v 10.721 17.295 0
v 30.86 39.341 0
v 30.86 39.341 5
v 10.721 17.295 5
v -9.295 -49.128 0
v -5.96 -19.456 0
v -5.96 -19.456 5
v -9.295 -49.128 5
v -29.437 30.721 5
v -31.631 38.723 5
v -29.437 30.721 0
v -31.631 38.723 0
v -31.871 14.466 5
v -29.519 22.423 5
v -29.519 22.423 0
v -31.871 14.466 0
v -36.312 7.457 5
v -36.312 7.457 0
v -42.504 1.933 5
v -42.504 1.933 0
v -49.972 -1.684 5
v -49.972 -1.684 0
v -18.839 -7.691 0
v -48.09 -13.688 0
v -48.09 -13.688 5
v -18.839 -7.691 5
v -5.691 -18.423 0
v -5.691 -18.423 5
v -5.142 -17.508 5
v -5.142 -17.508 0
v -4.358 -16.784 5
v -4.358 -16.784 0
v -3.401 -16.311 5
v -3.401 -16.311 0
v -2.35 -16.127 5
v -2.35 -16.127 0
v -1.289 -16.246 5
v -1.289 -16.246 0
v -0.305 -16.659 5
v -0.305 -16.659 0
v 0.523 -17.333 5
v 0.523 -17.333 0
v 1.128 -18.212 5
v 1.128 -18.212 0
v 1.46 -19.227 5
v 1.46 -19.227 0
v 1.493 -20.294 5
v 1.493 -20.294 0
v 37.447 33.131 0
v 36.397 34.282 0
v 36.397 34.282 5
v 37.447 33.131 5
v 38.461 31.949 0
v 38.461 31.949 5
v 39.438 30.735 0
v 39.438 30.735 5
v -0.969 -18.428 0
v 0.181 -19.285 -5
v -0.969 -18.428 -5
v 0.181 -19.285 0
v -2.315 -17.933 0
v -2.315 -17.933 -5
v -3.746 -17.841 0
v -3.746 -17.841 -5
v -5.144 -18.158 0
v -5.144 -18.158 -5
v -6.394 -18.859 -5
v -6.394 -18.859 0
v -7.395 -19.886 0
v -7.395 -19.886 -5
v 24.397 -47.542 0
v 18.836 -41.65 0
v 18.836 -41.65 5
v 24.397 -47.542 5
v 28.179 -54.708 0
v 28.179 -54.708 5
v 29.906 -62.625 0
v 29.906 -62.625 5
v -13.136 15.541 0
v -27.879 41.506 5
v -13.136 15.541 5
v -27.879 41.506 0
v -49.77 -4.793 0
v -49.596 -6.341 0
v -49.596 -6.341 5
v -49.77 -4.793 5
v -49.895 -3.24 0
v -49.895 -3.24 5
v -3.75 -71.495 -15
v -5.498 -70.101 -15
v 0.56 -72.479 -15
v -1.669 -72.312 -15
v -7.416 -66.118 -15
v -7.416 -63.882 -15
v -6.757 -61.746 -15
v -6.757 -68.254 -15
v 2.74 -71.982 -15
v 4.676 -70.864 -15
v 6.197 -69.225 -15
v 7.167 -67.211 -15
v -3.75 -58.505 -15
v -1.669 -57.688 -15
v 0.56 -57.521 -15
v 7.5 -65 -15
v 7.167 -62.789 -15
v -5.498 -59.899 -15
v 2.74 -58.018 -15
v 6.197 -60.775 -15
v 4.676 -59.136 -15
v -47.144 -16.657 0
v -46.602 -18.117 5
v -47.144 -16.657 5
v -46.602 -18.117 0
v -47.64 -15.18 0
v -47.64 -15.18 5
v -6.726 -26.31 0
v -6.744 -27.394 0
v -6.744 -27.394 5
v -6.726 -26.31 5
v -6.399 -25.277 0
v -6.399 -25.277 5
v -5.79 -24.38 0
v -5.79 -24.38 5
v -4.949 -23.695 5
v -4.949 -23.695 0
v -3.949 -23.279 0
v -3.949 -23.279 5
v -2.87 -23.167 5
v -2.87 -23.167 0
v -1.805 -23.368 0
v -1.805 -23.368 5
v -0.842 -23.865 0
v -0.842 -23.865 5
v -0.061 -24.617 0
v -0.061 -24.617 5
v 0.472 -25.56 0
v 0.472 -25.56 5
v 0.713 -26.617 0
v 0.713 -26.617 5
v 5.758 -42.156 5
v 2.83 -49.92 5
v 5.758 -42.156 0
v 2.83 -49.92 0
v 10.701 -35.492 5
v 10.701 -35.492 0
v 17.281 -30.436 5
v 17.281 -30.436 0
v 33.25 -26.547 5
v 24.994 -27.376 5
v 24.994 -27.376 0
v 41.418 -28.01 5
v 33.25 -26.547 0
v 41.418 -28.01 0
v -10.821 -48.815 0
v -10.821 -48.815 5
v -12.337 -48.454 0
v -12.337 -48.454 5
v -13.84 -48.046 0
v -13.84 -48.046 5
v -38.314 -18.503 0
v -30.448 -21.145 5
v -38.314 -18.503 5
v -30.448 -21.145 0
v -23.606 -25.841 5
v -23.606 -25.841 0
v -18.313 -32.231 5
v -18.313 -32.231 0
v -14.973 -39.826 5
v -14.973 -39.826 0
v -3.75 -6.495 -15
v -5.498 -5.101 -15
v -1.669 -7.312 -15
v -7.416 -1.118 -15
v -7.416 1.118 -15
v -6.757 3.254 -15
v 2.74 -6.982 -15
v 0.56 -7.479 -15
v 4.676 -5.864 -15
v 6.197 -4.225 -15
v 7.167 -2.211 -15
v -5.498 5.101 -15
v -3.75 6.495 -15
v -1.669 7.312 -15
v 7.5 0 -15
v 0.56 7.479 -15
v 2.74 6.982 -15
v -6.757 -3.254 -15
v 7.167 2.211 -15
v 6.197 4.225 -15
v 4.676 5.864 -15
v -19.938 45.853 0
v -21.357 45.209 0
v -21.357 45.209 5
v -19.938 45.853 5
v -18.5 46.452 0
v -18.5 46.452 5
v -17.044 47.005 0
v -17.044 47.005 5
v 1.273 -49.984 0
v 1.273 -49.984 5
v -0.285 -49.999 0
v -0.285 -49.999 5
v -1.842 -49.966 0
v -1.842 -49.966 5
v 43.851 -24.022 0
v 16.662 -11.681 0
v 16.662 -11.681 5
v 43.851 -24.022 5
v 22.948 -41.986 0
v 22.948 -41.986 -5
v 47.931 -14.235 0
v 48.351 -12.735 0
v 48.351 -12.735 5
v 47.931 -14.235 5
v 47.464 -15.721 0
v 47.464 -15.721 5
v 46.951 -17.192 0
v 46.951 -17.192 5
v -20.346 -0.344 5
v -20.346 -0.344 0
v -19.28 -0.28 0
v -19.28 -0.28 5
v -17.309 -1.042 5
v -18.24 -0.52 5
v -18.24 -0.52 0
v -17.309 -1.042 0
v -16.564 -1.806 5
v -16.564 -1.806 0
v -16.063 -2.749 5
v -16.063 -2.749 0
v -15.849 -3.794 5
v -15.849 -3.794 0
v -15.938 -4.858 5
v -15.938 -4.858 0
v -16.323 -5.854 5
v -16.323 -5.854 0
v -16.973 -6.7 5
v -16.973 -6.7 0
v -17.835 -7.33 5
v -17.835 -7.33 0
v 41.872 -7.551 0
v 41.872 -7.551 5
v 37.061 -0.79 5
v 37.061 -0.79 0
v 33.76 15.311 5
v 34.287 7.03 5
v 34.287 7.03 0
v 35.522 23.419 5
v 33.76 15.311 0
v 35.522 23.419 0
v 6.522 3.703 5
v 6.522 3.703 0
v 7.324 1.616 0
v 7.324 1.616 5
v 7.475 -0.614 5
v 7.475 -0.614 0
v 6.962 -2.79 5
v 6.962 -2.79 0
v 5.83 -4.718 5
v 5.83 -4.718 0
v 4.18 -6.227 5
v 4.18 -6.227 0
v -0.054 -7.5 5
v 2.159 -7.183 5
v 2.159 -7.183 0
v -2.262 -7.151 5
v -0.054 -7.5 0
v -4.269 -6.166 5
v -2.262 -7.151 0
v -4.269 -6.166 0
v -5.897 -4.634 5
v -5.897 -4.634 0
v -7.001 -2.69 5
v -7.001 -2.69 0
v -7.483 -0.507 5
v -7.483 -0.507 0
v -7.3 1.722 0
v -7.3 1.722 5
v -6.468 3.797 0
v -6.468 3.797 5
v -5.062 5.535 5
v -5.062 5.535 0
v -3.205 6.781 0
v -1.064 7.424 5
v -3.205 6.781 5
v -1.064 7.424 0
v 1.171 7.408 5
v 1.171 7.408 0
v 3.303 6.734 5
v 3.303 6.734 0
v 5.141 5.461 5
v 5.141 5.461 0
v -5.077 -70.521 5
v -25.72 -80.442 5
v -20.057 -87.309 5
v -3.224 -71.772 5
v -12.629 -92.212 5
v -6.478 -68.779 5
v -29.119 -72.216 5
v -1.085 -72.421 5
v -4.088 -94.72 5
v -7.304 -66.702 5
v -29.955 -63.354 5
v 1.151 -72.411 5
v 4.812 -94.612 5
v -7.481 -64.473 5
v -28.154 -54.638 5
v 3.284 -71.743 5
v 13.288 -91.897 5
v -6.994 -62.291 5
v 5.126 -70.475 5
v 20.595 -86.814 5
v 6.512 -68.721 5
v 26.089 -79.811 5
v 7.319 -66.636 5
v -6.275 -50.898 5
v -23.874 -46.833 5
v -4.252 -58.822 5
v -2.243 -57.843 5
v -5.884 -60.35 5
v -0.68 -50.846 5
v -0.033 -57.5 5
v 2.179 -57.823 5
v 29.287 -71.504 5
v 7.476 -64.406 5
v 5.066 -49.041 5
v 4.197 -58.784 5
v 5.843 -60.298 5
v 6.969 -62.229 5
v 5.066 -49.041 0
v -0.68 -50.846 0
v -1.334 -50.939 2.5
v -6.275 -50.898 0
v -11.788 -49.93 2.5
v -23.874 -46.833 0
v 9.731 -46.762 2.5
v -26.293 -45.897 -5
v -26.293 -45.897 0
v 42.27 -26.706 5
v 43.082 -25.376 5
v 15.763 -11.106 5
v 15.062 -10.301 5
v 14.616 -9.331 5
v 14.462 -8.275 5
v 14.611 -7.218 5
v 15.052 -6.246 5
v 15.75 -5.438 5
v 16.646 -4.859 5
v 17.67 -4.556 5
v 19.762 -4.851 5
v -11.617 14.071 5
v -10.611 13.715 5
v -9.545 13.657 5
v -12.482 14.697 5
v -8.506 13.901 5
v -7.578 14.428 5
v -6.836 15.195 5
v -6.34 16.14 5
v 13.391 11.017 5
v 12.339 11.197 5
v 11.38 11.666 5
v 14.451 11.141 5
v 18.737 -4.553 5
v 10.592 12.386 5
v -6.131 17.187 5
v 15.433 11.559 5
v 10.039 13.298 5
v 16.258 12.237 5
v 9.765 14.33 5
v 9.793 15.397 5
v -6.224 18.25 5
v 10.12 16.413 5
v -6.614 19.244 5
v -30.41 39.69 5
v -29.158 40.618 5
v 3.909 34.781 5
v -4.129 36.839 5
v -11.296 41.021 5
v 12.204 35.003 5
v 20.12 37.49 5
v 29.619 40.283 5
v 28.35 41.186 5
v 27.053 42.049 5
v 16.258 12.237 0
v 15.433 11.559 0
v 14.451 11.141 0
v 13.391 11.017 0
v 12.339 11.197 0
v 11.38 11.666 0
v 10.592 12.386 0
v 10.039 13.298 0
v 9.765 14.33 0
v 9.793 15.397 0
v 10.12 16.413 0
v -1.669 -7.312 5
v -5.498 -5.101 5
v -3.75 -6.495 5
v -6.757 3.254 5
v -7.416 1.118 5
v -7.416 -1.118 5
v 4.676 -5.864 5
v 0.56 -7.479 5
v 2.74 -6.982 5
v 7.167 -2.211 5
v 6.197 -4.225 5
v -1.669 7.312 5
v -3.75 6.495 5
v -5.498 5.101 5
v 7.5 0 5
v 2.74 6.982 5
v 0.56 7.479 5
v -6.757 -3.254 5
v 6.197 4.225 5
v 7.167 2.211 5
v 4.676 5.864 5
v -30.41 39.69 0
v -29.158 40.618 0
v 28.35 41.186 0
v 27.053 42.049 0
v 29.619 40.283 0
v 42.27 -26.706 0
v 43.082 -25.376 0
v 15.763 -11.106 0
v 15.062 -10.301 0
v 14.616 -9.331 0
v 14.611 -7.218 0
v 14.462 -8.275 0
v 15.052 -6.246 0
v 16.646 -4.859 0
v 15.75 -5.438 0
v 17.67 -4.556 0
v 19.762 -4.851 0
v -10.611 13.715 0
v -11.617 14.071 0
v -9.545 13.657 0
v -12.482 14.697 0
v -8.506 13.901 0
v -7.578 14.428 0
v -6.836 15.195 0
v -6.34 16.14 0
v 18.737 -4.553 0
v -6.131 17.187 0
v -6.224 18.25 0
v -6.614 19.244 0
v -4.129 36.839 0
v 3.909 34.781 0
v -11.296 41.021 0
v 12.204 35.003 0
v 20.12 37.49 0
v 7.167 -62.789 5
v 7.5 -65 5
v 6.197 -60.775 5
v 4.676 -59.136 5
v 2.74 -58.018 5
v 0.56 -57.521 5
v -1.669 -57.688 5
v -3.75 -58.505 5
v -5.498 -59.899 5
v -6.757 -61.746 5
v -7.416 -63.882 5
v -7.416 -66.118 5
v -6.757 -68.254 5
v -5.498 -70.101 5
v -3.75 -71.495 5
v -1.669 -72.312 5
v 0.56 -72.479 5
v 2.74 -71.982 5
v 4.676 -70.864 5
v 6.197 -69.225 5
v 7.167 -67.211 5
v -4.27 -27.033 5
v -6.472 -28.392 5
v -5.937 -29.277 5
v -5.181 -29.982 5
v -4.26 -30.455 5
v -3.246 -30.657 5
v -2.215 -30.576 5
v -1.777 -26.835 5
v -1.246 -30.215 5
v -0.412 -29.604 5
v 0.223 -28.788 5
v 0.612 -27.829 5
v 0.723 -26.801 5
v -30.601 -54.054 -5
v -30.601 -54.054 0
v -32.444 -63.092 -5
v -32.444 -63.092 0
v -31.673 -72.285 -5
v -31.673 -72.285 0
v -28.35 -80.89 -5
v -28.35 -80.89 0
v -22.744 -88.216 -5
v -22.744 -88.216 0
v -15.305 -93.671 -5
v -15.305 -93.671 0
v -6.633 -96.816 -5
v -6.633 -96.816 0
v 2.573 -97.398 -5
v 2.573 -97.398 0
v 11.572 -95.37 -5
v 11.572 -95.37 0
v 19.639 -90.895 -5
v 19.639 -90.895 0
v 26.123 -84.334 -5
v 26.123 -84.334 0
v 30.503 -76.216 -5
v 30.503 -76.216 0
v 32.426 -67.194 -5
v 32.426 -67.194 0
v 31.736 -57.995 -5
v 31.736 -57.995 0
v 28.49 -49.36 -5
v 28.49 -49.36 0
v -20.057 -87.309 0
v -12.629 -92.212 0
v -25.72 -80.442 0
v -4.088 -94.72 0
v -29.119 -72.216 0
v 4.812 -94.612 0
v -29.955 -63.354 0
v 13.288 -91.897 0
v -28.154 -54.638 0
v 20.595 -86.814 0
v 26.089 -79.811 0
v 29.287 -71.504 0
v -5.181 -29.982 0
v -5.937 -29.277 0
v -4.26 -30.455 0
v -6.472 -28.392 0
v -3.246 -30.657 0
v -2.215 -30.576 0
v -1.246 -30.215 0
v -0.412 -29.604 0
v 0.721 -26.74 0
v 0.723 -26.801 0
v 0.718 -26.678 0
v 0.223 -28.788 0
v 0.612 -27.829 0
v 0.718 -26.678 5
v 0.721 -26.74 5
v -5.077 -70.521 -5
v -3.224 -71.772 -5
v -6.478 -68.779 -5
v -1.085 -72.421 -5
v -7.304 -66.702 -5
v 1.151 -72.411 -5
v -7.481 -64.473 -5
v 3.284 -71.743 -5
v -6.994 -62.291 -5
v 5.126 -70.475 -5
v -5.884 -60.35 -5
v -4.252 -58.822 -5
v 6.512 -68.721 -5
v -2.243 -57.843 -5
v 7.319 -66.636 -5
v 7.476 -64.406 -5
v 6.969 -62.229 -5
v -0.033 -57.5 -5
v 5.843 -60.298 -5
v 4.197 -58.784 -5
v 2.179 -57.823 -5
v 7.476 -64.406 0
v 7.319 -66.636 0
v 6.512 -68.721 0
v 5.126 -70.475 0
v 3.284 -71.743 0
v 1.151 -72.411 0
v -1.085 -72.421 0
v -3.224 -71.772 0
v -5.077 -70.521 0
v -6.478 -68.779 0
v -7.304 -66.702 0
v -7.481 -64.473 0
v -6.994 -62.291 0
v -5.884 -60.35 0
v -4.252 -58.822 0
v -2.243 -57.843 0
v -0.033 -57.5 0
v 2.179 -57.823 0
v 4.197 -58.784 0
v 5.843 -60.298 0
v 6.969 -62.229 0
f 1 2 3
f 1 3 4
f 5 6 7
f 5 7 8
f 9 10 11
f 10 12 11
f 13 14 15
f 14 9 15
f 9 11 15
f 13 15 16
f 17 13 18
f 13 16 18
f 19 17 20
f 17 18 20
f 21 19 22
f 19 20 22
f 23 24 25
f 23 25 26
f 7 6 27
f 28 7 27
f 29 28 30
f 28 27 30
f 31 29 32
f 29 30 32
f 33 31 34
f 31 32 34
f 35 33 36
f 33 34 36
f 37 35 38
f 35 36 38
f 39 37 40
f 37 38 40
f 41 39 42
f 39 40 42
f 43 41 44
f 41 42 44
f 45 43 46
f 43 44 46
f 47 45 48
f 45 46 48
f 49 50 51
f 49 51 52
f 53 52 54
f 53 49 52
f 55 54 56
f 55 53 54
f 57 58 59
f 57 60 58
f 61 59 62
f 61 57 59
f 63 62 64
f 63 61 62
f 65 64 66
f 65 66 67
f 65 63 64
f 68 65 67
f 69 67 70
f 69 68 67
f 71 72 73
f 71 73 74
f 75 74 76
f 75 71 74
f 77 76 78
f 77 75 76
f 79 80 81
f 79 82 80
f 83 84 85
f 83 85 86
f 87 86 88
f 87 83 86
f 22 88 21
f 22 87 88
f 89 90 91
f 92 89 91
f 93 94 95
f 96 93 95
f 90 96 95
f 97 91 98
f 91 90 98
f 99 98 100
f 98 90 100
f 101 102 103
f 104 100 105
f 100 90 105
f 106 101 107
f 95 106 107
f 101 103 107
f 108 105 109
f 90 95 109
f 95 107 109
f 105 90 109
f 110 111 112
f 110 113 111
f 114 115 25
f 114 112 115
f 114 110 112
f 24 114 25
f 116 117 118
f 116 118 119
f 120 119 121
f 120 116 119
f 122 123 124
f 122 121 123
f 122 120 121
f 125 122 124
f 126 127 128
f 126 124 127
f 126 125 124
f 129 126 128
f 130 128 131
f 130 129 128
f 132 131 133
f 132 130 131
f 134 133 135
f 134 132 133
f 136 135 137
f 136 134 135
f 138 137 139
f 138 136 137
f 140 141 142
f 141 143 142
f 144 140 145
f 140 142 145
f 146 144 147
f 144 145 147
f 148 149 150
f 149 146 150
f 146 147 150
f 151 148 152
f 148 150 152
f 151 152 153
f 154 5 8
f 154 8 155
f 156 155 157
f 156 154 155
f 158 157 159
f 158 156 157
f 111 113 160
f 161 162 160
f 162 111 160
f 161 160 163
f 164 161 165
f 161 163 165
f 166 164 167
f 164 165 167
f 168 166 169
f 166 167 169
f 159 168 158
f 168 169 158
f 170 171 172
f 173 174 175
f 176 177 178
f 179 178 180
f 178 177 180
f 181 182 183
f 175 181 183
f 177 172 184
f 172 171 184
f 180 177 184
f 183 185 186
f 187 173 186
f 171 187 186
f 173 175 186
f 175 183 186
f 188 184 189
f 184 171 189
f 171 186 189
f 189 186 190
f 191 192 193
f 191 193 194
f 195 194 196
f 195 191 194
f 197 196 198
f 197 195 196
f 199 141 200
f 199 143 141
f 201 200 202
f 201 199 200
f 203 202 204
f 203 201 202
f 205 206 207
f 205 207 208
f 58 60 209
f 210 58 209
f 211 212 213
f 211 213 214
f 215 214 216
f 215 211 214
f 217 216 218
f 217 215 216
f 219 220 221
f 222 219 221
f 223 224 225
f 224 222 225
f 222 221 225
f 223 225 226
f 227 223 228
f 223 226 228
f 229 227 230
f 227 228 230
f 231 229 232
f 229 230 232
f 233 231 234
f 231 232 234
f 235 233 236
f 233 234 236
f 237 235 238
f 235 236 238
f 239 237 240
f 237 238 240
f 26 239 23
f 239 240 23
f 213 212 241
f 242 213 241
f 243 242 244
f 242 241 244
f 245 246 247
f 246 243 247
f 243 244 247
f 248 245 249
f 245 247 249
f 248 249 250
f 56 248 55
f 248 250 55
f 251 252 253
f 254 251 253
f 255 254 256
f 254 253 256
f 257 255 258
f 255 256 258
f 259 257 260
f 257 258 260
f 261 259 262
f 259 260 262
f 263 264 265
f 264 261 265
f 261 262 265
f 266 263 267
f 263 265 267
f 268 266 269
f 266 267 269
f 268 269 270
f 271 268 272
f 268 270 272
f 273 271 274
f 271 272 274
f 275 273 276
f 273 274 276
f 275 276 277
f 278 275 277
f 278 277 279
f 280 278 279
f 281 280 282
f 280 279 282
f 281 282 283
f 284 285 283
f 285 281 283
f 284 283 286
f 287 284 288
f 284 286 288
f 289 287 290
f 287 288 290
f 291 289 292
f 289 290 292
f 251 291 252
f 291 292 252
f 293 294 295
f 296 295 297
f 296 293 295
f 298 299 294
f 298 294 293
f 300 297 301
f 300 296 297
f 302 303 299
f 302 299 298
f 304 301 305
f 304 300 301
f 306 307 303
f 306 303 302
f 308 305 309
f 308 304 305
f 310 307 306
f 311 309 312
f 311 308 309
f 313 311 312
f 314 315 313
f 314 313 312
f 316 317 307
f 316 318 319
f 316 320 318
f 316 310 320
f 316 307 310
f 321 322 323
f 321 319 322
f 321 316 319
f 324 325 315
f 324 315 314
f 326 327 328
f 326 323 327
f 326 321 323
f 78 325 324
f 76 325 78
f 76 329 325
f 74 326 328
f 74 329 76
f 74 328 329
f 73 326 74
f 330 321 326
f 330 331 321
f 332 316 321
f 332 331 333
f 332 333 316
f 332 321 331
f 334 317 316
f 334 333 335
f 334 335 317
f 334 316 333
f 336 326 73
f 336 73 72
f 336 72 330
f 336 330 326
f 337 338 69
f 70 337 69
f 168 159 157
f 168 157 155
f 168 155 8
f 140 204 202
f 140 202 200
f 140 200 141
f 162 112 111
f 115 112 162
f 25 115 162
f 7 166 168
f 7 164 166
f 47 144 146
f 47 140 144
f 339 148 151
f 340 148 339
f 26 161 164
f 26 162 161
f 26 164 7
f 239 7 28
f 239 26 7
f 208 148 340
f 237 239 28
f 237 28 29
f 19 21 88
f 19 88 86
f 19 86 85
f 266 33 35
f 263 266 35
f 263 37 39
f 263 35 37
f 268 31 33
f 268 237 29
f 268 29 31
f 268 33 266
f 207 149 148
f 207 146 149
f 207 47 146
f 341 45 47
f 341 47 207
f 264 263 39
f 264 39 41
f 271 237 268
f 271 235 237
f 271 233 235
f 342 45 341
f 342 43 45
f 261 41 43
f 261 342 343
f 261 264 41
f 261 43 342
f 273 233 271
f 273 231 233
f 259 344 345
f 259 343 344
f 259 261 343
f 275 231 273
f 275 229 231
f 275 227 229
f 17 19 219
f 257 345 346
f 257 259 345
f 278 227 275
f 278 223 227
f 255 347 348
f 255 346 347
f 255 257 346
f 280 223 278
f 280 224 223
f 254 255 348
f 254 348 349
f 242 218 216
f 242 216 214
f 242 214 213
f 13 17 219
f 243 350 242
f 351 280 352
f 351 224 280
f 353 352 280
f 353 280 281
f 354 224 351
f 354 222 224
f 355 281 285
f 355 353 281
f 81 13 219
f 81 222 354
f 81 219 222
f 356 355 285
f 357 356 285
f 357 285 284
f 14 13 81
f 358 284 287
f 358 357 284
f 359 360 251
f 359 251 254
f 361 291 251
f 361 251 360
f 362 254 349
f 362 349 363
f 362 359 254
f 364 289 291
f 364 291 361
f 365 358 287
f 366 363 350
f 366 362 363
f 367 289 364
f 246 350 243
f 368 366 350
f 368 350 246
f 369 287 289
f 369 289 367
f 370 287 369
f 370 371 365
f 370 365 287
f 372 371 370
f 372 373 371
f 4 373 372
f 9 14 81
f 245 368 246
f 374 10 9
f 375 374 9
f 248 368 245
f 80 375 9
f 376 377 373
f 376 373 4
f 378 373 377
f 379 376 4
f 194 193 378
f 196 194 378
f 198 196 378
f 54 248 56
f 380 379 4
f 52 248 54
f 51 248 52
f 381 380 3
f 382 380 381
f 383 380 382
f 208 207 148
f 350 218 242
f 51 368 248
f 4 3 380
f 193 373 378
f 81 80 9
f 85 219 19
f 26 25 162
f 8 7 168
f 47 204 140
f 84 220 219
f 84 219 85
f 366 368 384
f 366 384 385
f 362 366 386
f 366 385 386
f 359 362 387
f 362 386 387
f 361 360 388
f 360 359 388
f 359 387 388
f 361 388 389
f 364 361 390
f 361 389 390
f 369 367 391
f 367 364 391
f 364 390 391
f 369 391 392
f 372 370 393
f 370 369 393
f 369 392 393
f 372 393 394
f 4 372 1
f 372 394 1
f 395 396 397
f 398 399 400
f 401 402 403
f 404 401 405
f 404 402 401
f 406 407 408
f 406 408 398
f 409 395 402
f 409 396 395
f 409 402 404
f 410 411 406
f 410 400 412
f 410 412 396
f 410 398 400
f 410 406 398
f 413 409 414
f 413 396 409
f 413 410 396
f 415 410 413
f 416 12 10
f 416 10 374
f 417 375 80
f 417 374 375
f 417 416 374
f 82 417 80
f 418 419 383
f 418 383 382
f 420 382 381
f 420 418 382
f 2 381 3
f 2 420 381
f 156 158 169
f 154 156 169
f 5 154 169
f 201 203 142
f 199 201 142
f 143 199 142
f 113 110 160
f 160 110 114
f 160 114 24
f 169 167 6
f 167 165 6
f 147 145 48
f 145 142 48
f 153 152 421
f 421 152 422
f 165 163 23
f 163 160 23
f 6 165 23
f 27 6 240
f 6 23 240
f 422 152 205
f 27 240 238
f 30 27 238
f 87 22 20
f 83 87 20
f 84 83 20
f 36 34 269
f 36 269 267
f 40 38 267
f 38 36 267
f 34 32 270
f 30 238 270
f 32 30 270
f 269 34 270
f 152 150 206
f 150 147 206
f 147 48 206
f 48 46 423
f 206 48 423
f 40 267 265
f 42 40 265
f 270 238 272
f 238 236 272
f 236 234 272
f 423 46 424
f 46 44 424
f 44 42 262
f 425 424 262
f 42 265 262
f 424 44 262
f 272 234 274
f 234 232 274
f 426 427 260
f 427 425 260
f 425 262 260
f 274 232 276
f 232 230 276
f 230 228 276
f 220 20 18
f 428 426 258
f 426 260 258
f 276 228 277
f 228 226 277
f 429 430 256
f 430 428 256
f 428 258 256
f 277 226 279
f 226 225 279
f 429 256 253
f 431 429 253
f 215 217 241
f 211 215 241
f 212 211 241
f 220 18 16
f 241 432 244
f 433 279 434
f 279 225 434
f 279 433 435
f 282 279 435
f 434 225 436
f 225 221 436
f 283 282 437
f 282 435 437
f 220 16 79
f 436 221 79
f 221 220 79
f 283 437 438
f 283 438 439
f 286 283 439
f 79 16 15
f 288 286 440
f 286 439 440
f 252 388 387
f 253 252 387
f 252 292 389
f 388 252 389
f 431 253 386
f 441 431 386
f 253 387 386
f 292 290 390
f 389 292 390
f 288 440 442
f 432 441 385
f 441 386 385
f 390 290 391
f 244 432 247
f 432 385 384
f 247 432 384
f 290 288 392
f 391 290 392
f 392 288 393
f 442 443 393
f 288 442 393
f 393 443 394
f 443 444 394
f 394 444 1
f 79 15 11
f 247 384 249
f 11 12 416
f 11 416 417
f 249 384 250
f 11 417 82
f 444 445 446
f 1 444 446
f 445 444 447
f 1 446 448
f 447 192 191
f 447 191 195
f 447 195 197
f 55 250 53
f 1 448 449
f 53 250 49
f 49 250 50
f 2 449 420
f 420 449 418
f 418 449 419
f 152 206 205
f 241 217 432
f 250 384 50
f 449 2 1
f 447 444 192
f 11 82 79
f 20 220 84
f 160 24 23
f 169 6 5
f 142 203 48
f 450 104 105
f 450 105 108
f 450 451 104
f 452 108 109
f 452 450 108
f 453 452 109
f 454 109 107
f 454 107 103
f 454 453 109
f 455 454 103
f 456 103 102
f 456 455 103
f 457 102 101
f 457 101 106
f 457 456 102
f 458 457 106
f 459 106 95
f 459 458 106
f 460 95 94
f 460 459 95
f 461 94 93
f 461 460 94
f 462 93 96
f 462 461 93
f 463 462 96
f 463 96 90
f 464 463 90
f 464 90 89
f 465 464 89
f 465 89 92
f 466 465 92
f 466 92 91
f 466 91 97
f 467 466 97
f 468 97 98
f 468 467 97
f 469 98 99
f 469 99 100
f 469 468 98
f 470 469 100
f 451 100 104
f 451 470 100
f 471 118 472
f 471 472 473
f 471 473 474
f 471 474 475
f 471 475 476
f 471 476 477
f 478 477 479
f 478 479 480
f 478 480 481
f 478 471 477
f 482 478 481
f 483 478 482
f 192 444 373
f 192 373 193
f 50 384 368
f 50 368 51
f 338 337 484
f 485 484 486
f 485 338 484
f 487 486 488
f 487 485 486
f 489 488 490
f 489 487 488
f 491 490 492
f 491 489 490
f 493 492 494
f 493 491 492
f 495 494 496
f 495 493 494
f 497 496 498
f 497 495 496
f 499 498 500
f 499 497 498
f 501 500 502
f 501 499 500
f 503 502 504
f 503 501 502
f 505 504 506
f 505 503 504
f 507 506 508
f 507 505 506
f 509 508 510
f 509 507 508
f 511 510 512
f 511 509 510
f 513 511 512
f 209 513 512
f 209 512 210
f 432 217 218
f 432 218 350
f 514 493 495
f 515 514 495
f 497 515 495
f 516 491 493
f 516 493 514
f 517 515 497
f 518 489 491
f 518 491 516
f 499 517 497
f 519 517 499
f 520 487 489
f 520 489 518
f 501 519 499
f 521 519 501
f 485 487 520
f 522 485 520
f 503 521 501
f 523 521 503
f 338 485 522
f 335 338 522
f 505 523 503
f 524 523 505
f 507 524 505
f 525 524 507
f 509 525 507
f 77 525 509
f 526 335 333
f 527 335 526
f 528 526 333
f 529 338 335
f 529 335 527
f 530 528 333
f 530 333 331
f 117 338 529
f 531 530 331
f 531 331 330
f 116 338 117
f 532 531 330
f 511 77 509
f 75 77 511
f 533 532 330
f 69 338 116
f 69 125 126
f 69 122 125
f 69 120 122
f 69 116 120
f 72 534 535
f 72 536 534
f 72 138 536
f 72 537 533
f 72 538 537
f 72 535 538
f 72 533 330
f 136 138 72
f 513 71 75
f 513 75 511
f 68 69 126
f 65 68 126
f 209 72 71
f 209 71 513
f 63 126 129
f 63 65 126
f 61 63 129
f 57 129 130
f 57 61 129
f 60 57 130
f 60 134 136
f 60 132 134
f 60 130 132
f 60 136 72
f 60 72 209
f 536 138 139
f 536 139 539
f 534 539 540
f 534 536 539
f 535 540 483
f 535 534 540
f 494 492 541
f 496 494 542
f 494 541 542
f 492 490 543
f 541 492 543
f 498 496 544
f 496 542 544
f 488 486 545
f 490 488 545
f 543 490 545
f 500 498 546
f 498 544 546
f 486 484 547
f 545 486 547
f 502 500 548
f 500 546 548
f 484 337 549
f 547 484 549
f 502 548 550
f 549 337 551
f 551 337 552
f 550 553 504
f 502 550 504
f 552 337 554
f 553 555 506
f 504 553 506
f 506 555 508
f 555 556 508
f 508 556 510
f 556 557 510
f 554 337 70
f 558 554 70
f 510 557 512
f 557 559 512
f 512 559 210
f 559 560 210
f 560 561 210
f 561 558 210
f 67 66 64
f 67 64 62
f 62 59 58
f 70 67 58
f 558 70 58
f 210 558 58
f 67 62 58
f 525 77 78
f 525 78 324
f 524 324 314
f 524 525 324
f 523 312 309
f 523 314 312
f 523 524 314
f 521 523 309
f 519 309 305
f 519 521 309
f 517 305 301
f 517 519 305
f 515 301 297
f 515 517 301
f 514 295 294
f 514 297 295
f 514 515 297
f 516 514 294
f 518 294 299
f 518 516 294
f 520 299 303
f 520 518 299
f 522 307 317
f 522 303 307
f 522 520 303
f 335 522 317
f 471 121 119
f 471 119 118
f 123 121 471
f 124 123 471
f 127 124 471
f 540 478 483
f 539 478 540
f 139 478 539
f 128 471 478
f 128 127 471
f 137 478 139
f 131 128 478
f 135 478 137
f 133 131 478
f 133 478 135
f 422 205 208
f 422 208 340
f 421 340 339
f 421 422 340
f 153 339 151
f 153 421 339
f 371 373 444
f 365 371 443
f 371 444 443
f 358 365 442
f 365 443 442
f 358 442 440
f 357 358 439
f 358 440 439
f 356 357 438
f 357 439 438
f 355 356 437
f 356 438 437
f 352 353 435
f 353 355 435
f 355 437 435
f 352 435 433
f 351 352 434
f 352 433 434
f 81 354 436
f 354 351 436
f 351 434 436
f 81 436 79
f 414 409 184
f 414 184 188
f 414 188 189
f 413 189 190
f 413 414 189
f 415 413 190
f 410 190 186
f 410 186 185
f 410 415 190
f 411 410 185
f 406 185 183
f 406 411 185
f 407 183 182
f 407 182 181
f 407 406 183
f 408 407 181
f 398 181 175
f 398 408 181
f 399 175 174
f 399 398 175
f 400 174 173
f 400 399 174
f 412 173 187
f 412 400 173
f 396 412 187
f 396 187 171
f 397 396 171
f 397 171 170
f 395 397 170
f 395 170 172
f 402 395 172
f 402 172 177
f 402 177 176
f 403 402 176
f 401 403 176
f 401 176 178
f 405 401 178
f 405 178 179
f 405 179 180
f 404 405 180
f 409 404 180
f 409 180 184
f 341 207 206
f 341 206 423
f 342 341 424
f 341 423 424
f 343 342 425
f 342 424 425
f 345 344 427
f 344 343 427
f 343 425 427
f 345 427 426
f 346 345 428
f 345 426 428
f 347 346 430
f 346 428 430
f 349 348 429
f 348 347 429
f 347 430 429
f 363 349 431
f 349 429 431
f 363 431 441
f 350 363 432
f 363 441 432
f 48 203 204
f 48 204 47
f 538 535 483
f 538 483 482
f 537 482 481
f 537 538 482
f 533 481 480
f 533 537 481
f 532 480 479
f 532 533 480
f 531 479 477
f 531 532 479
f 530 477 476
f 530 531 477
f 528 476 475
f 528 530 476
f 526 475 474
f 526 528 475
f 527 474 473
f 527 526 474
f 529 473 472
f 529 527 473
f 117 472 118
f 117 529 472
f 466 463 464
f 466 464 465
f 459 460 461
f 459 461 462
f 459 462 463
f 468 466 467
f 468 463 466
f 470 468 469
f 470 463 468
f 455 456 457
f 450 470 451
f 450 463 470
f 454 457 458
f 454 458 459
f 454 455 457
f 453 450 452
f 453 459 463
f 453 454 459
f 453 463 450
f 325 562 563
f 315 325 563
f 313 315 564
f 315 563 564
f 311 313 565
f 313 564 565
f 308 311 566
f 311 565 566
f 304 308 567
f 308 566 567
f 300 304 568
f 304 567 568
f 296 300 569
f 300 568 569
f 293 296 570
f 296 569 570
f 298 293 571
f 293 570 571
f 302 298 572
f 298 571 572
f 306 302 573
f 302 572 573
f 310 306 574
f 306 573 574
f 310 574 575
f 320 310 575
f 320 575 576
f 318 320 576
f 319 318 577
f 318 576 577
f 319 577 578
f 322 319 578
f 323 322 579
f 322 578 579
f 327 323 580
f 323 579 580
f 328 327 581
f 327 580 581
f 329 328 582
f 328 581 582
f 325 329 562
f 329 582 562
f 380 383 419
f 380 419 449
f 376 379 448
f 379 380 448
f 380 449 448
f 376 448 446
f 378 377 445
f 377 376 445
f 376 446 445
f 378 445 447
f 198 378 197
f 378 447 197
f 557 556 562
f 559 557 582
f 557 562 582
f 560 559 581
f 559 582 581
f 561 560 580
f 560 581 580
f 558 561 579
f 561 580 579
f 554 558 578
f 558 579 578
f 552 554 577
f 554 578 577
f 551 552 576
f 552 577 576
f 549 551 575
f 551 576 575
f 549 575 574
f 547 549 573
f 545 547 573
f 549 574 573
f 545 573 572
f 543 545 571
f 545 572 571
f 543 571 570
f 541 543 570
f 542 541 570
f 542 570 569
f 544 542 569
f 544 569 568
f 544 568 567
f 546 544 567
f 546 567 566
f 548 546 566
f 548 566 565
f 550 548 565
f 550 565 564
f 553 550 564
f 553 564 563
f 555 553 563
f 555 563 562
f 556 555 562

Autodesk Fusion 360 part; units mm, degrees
sketch "Sketch1" plane through (0, 0, 0) normal (0, 0, 1) x (1, 0, 0) in component "Follower"
  line L0 (0, 0) -> (29.3893, -40.4508) construction
  line L1 (0, 0) -> (50, 0) construction
  line L2 (0, 0) -> (-9.5515, -13.1465) construction
  line L3 (0, 0) -> (50, 0) construction
  line L4 (8.7219, -18.3845) -> (26.3554, -42.655)
  line L5 (32.4231, -38.2467) -> (14.7895, -13.9761)
  arc A0 (14.7895, -13.9761) -> (8.7219, -18.3845) centre (11.7557, -16.1803) ccw
  line L6 (20.1799, 2.6139) -> (48.5777, 11.8409)
  arc A1 (17.8623, 9.7468) -> (20.1799, 2.6139) centre (19.0211, 6.1803) ccw
  line L7 (46.394, 19.0173) -> (17.8623, 9.7468)
  line L8 (3.75, 20) -> (3.75, 50)
  arc A2 (-3.75, 20) -> (3.75, 20) centre (0, 20) ccw
  line L9 (-3.75, 50) -> (-3.75, 20)
  line L10 (-17.8623, 9.7468) -> (-46.394, 19.0173)
  arc A3 (-20.1799, 2.6139) -> (-17.8623, 9.7468) centre (-19.0211, 6.1803) ccw
  line L11 (-48.7116, 11.8844) -> (-20.1799, 2.6139)
  line L12 (-14.7895, -13.9761) -> (-32.4231, -38.2467)
  arc A4 (-8.7219, -18.3845) -> (-14.7895, -13.9761) centre (-11.7557, -16.1803) ccw
  line L13 (-26.3554, -42.655) -> (-8.7219, -18.3845)
  circle A5 centre (0, 0) radius 7.5
  arc A6 (22.1872, -44.8077) -> (-22.1872, -44.8077) centre (0, -65) ccw
  arc A7 (-29.3183, -40.5023) -> (-18.1729, -31.3928) centre (0, -65) ccw construction
  arc A8 (-29.3893, -40.4508) -> (-29.3183, -40.5023) centre (0, 0) ccw
  arc A9 (-26.2727, -42.5411) -> (-22.1872, -44.8077) centre (0, 0) ccw
  arc A10 (22.1872, -44.8077) -> (26.2727, -42.5411) centre (0, 0) ccw
  arc A11 (29.3183, -40.5023) -> (29.3893, -40.4508) centre (0, 0) ccw
  arc A12 (49.4709, 7.2549) -> (35.7584, -34.9476) centre (61.8187, -20.0861) ccw
  arc A13 (8.3875, 49.2915) -> (44.2871, 23.2089) centre (38.206, 52.5861) ccw
  arc A14 (-44.2871, 23.2089) -> (-8.3875, 49.2915) centre (-38.206, 52.5861) ccw
  arc A15 (-35.7584, -34.9476) -> (-49.4709, 7.2549) centre (-61.8187, -20.0861) ccw
  arc A16 (-48.5777, 11.8409) -> (-49.4709, 7.2549) centre (0, 0) ccw
  arc A17 (-35.7584, -34.9476) -> (-32.3403, -38.1327) centre (0, 0) ccw
  arc A18 (-3.75, 49.8592) -> (-8.3875, 49.2915) centre (0, 0) ccw
  arc A19 (-44.2871, 23.2089) -> (-46.2601, 18.9738) centre (0, 0) ccw
  arc A20 (46.2601, 18.9738) -> (44.2871, 23.2089) centre (0, 0) ccw
  arc A21 (8.3875, 49.2915) -> (3.75, 49.8592) centre (0, 0) ccw
  arc A22 (32.3403, -38.1327) -> (35.7584, -34.9476) centre (0, 0) ccw
  arc A23 (50, 0) -> (48.5777, 11.8409) centre (0, 0) ccw
  dimension "d1" = 100
  dimension "d2" = 54
  dimension "d3" = 50
  dimension "d4" = 126
  dimension "d5" = 65
  dimension "d6" = 60
  dimension "d8" = 20
  dimension "d11" = 15
  dimension "d13" = 360
extrude "Extrude1" add sketch "Sketch1" along normal blind 5 makes body 1 in component "Follower"
sketch "Sketch1 (2)" plane through (0, 0, 0) normal (0, 0, 1) x (1, 0, 0) in component "Cam"
  arc A0 (-29.3183, -40.5023) -> (-18.1729, -31.3928) centre (0, -65) ccw
  circle A1 centre (0, -65) radius 30
  circle A2 centre (0, -65) radius 32.5
  circle A3 centre (0, -65) radius 7.5
  circle A4 centre (0, -26.794) radius 3.75
  line L0 (-24.6979, -43.875) -> (-3.7997, -19.4423)
  line L1 (3.7997, -19.4423) -> (24.6979, -43.875)
  arc A5 (3.7997, -19.4423) -> (-3.7997, -19.4423) centre (0, -22.6923) ccw
  spline S0 degree 2 poles (-22.3607, -45) (0, -53.1337) (20.6252, -43.2146) knots 0 0 0 4.511642 4.511642 4.511642 weights 1 3 1
  point P0 (0, -15)
  dimension "d16" = 60
  dimension "d17" = 65
  dimension "d18" = 15
  dimension "d19" = 7.5
  dimension "d20" = 15
  dimension "d21" = 5
  dimension "d23" = 20
extrude "Extrude1'" add sketch "Sketch1 (2)" against normal blind 5 separate body contours A0 A2 A4 L0 L1 | A0 A4 L0 L1 A5 | A0 A4 | A0 A4 | A2 | A1 S0 | A1 S0 makes body 2 in component "Cam"
extrude "Extrude2" add sketch "Sketch1 (2)" along normal blind 5 contours A0 A4 | A0 A4 | A1 S0 picked at (14.8588, -54.2841) bodies 2 in component "Cam"
cylinder "CylinderPrimitive1" add diameter 15 height -20 placed x (1, 0, 0) y (0, 1, 0) z (0, 0, 1) at (0, 0, 5) separate body makes body 3 in component "Component"
component "Follower" placed x (0.869606, 0.493747, 0) y (-0.493747, 0.869606, 0) z (0, 0, 1) at (0, 0, 0)
component "Cam" placed x (0.996861, 0.079176, 0) y (-0.079176, 0.996861, 0) z (0, 0, 1) at (-5.1464, -0.2041, 0)
component "Component" placed x (1, 0, 0) y (0, 1, 0) z (0, 0, 1) at (0, 0, 0)
component "Component" placed x (1, 0, 0) y (0, 1, 0) z (0, 0, 1) at (0, -65, 0)
